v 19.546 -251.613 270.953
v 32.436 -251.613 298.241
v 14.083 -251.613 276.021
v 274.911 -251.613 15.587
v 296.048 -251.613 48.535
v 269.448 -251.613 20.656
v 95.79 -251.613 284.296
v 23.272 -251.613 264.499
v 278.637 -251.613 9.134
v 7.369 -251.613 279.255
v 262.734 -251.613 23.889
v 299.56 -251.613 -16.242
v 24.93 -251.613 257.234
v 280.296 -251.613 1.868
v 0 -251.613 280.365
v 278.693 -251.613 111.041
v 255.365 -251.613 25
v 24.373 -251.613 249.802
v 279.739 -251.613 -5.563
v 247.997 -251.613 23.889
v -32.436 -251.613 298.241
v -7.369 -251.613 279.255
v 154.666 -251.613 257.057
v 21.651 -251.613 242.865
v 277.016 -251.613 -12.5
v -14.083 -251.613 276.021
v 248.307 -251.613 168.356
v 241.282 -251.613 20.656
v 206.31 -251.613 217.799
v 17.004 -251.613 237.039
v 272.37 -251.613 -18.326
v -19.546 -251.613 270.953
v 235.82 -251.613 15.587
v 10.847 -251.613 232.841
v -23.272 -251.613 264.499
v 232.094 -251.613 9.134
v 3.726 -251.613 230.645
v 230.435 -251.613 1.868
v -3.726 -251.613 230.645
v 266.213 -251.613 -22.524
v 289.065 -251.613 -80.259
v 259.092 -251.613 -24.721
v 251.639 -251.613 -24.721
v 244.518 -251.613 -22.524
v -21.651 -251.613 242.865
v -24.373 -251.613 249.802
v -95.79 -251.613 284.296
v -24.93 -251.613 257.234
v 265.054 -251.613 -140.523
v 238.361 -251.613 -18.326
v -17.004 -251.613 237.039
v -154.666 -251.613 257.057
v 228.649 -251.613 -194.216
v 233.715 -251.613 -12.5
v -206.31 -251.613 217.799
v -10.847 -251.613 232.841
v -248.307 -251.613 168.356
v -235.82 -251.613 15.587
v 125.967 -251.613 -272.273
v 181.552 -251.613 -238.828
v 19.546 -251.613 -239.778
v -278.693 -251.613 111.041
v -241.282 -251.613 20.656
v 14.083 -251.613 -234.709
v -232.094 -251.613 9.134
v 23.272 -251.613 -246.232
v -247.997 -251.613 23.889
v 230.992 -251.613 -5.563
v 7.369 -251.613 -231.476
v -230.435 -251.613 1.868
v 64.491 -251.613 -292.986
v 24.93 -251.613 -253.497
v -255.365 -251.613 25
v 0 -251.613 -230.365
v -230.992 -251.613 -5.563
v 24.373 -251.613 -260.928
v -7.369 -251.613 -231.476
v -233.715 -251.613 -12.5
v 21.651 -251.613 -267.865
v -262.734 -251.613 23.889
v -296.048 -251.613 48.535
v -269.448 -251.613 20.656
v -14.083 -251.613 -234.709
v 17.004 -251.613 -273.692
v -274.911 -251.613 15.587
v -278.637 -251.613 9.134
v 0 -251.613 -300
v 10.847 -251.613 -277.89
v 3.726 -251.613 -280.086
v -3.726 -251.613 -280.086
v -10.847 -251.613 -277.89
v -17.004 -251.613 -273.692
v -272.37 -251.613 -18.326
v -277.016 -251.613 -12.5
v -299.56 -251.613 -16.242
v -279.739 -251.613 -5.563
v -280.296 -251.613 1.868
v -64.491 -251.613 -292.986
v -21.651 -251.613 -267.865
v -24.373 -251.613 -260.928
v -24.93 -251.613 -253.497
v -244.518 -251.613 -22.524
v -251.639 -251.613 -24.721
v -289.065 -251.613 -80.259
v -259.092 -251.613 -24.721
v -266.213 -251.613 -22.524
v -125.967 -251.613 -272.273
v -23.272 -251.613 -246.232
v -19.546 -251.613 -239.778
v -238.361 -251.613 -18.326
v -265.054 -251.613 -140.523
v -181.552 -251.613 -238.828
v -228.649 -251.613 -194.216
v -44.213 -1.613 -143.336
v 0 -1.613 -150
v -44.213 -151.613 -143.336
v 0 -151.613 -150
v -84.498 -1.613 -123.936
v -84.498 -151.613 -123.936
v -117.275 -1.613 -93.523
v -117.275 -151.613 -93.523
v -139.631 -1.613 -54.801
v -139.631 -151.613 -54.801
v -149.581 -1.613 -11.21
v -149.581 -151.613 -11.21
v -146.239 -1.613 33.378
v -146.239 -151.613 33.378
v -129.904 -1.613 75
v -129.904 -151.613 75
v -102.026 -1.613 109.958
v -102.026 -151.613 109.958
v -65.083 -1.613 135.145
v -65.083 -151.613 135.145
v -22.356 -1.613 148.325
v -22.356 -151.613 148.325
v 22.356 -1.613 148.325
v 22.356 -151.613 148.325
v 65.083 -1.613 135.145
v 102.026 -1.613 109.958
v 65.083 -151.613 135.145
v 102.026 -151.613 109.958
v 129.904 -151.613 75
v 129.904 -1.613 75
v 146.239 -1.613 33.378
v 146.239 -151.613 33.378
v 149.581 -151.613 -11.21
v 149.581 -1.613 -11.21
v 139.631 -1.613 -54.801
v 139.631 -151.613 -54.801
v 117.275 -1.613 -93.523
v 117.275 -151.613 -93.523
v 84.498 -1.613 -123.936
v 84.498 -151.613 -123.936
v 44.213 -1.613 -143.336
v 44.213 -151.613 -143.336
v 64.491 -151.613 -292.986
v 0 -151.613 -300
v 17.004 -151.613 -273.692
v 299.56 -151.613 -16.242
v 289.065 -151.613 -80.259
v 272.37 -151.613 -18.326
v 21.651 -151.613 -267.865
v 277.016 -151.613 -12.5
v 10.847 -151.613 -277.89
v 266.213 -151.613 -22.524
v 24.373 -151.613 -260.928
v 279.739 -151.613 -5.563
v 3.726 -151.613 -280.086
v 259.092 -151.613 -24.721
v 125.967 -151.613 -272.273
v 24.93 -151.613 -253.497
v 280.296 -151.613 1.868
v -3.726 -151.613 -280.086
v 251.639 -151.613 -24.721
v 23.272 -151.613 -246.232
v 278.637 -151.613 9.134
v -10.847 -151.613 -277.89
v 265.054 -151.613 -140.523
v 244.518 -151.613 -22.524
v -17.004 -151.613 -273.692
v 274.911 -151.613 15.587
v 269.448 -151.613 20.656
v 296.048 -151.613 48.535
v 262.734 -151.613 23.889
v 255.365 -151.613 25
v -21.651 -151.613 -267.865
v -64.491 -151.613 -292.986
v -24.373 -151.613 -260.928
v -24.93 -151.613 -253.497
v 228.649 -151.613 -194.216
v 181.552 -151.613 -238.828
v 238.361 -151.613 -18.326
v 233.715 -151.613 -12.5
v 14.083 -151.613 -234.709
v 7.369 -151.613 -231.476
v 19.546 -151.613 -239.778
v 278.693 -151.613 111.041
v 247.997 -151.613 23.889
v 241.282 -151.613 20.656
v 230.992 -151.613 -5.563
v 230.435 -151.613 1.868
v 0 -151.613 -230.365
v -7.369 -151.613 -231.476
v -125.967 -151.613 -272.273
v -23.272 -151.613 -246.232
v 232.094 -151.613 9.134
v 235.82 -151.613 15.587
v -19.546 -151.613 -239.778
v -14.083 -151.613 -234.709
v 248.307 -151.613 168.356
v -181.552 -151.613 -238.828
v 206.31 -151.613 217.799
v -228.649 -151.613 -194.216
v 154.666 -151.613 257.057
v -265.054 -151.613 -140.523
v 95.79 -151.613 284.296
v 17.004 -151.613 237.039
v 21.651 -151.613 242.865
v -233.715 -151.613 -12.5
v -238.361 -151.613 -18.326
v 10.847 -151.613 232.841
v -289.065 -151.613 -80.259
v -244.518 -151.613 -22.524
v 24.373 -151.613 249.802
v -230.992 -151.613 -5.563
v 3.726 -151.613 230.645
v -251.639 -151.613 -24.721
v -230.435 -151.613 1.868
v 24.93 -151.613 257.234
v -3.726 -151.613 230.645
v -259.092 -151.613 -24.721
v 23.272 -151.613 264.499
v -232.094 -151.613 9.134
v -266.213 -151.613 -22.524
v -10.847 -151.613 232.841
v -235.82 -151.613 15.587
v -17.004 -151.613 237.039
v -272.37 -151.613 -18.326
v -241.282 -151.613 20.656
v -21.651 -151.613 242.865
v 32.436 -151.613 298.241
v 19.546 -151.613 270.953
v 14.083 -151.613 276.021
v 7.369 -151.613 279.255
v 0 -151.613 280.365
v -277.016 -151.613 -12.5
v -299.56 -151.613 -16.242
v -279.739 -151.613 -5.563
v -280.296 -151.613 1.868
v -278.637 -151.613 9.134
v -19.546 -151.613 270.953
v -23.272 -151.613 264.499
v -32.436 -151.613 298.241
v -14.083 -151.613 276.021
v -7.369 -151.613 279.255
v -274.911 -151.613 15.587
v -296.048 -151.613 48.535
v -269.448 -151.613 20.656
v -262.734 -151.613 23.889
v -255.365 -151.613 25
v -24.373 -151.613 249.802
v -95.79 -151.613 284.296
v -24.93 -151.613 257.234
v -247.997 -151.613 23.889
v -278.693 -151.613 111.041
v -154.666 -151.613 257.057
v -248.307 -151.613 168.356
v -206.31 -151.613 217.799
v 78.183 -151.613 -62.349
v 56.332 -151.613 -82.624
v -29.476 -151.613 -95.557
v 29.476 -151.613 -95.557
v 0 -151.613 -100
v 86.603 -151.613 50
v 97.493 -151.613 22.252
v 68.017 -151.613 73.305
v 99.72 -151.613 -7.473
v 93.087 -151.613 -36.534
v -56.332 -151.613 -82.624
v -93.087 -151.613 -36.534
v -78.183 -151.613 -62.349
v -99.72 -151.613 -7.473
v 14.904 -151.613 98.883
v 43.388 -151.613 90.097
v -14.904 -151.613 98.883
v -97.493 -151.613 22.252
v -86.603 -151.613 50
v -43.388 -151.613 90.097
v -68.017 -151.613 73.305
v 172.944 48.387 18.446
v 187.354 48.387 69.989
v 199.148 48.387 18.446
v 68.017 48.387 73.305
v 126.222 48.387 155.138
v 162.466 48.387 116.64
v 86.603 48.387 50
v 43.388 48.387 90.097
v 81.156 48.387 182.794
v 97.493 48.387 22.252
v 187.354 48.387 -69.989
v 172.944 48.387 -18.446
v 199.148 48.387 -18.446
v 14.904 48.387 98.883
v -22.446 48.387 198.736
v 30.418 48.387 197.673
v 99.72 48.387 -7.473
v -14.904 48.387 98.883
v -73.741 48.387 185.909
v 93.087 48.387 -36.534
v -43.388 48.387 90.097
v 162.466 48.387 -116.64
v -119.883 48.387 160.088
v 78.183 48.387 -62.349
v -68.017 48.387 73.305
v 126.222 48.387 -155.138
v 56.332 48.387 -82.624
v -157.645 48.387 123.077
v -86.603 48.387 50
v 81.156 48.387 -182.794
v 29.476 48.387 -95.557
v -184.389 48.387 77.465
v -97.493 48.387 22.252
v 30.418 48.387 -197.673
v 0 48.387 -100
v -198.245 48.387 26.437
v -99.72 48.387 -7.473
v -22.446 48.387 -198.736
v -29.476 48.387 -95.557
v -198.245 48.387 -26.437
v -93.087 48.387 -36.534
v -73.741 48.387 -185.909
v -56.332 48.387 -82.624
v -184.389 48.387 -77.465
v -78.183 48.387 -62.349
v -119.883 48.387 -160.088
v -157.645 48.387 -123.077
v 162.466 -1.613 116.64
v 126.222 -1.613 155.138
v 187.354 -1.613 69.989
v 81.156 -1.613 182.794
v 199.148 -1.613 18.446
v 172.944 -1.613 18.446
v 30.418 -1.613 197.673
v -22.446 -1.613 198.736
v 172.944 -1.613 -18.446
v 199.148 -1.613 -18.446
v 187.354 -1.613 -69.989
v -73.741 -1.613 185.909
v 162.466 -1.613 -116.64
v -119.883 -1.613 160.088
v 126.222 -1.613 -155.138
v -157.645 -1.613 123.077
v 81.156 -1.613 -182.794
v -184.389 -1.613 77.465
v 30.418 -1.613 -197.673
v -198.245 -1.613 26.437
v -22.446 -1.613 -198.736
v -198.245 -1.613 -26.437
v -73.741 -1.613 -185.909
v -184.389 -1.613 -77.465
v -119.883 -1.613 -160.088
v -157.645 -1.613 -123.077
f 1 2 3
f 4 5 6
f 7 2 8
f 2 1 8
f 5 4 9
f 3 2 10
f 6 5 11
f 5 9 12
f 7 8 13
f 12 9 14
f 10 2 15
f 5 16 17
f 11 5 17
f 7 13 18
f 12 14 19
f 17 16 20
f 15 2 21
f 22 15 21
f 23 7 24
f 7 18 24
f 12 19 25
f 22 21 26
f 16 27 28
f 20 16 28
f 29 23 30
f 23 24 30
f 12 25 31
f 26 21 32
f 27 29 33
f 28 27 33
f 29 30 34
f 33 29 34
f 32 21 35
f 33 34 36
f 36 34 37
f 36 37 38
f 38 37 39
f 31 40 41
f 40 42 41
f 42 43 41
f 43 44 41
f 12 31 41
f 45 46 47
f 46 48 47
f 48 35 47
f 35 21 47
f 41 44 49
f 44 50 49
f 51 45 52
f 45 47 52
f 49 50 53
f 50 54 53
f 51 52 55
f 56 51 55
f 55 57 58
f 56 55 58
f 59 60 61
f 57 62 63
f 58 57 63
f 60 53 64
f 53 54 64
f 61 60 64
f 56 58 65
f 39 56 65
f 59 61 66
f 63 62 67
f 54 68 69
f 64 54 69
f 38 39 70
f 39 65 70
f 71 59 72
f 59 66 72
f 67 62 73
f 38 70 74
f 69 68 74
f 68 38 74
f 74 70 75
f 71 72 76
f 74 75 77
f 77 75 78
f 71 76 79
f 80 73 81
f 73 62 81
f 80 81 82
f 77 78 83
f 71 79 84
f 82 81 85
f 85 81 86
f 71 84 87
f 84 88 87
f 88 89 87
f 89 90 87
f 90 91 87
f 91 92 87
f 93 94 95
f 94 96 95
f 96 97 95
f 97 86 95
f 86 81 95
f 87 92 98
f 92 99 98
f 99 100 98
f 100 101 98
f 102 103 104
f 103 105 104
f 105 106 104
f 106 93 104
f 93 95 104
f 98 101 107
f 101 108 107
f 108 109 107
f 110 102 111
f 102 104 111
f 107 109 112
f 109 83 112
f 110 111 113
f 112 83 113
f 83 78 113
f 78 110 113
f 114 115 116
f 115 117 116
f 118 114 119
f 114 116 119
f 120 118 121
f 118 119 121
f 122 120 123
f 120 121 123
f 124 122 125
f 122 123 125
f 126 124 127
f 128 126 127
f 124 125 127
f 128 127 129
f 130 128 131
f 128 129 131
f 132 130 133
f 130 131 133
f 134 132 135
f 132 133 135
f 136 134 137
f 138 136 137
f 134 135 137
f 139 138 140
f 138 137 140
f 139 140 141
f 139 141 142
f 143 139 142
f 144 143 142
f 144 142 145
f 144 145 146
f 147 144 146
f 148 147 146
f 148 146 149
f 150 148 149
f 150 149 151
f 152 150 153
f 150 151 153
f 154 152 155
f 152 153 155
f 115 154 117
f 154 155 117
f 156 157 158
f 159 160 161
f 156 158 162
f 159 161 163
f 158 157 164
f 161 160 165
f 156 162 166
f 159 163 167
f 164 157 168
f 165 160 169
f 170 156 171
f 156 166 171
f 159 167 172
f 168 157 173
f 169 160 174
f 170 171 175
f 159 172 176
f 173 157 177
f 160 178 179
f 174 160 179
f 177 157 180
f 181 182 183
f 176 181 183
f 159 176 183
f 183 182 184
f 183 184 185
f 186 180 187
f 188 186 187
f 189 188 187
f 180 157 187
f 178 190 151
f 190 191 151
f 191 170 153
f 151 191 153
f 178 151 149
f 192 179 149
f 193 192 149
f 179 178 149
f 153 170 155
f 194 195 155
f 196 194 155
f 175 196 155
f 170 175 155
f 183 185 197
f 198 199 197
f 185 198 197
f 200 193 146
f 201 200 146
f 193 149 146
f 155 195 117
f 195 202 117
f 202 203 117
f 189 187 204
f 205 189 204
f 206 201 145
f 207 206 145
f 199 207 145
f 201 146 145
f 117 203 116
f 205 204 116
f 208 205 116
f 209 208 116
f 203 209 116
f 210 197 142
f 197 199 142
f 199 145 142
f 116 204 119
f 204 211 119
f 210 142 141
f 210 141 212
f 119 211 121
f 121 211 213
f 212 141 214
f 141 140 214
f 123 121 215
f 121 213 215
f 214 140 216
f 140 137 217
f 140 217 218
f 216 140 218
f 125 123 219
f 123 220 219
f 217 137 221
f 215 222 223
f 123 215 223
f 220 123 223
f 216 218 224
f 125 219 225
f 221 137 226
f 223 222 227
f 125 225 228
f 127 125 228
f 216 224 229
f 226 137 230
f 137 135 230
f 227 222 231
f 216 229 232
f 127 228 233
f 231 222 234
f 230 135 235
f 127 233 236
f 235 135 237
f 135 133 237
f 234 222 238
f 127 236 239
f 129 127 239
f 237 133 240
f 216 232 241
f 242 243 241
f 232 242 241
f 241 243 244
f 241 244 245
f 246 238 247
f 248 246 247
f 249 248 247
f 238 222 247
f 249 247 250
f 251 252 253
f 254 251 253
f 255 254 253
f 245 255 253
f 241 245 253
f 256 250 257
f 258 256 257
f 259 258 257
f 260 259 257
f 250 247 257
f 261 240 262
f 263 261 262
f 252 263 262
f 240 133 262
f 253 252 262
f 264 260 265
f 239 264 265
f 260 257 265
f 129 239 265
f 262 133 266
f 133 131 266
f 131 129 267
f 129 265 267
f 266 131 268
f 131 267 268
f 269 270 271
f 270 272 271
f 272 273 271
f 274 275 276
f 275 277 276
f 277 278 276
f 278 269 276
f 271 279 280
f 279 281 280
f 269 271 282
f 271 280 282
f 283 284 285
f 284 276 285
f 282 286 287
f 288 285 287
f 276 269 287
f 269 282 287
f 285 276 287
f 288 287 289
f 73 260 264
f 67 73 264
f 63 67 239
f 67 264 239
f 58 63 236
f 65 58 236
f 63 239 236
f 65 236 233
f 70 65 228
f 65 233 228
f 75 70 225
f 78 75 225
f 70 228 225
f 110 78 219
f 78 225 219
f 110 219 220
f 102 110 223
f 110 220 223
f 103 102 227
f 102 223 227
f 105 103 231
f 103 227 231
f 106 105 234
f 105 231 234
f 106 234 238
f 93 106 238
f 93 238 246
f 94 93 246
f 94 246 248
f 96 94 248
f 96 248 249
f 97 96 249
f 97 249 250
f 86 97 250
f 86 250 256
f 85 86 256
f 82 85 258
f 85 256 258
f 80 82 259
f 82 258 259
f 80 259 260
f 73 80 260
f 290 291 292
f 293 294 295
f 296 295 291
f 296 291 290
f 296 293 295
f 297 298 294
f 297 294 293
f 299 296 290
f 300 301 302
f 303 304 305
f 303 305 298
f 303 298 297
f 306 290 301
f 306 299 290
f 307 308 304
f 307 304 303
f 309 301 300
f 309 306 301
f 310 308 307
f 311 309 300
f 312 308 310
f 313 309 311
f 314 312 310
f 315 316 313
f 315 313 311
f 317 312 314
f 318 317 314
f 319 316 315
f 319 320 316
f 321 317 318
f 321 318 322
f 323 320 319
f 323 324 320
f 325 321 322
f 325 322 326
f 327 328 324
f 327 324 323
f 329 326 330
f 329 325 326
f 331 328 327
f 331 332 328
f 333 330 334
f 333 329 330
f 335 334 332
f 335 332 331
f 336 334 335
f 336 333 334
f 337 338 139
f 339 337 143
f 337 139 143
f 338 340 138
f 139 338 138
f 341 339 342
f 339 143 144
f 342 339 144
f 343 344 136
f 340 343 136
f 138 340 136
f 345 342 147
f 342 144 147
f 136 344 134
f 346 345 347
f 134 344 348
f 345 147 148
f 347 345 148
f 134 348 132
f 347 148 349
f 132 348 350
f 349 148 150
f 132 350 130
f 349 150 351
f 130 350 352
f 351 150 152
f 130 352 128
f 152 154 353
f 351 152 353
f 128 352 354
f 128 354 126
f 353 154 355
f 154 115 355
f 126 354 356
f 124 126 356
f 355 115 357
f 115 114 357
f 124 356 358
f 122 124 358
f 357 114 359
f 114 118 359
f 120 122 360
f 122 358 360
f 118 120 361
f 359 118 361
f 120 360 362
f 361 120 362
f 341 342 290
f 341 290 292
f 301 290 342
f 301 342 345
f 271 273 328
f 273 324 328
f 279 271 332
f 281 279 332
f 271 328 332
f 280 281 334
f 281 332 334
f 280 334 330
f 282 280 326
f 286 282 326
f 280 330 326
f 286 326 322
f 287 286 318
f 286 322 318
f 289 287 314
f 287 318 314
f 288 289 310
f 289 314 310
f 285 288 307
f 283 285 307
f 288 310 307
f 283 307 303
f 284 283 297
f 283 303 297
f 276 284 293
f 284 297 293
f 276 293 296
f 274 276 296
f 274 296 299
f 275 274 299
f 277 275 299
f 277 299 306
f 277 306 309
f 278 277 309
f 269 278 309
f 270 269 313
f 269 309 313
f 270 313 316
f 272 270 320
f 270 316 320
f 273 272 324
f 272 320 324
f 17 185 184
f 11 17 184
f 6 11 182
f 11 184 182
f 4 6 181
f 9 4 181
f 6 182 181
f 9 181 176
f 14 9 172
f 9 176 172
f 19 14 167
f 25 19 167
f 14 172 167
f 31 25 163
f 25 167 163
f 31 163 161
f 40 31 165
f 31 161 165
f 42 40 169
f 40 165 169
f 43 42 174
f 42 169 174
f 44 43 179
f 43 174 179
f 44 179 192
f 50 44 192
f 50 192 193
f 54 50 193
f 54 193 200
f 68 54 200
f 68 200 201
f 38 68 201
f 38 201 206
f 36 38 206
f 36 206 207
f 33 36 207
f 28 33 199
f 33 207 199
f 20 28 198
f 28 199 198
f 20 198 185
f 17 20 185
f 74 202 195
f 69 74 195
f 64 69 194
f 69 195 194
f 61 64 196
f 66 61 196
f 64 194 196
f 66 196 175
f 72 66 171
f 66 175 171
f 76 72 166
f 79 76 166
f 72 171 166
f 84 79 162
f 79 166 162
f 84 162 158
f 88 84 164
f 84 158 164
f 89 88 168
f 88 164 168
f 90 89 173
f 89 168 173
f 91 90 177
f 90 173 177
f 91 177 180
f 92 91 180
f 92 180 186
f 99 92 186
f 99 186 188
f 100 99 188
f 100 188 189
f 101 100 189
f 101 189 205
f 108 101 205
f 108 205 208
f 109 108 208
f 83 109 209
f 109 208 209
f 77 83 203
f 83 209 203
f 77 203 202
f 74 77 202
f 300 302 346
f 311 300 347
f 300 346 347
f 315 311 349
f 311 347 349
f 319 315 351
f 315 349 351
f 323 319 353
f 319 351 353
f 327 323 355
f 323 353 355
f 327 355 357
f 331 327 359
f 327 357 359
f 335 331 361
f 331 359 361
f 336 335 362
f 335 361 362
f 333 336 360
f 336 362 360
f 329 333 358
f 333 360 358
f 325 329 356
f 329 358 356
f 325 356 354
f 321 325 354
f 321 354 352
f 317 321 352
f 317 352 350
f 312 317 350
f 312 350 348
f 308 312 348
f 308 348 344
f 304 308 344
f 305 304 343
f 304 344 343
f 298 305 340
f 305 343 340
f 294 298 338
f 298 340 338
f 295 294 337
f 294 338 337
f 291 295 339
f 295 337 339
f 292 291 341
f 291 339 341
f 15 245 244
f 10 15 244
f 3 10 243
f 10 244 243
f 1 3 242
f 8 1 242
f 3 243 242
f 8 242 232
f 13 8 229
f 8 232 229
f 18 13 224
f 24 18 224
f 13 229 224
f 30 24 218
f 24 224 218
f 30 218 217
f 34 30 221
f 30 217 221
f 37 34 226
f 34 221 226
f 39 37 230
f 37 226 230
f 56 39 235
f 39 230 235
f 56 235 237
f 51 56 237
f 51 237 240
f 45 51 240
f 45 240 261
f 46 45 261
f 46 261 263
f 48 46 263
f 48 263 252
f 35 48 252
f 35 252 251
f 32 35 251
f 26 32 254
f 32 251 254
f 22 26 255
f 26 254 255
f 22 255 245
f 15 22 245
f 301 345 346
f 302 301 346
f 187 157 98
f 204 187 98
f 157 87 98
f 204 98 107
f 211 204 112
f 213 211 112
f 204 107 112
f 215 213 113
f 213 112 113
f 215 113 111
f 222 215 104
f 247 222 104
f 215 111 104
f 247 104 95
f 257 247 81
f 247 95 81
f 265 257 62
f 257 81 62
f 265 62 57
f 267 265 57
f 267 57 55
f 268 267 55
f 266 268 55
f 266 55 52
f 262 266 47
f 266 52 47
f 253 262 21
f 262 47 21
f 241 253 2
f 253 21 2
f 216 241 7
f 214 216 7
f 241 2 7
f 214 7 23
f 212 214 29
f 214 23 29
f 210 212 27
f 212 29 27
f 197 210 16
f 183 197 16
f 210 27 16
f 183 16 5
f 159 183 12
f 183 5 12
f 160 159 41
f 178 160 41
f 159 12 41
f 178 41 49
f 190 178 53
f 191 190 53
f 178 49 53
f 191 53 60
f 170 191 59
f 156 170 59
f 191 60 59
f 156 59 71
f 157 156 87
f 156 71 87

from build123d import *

# Parameters (mm, degrees)
SKETCH5_R          = 25
CUT_EXTRUDE2_DEPTH = 100
SKETCH6_W          = 54.11225924
SKETCH6_H          = 36.891131312
CUT_EXTRUDE3_DEPTH = 75


with BuildPart() as part:
    # Sketch4 → Revolve2 (revolve)
    with BuildSketch(Plane.XY):
        Polygon((0, -251.612903226), (0, -151.612903226), (100, -151.612903226), (100, 48.387096774), (152.822580645, 48.387096774), (200, 48.387096774), (200, -1.612903226), (150, -1.612903226), (150, -151.612903226), (300, -151.612903226), (300, -251.612903226), align=None)
    revolve(axis=Axis((0, -251.612903226, 0), (0, 1, 0)))

    # Sketch5 → Cut-Extrude2 (cut)
    with BuildSketch(Plane(origin=(0, -151.612903226, 0), x_dir=(1, 0, 0), z_dir=(0, 1, 0))):
        with Locations((0, 255.365455535)):
            Circle(SKETCH5_R)
        with Locations((255.365455535, 0)):
            Circle(SKETCH5_R)
        with Locations((0, -255.365455535)):
            Circle(SKETCH5_R)
        with Locations((-255.365455535, 0)):
            Circle(SKETCH5_R)
    extrude(amount=-CUT_EXTRUDE2_DEPTH, mode=Mode.SUBTRACT)

    # Sketch6 → Cut-Extrude3 (cut)
    with BuildSketch(Plane(origin=(0, 48.387096774, 0), x_dir=(1, 0, 0), z_dir=(0, 1, 0))):
        with Locations((200, 0)):
            Rectangle(SKETCH6_W, SKETCH6_H)
    extrude(amount=-CUT_EXTRUDE3_DEPTH, mode=Mode.SUBTRACT)


solid = part.part
